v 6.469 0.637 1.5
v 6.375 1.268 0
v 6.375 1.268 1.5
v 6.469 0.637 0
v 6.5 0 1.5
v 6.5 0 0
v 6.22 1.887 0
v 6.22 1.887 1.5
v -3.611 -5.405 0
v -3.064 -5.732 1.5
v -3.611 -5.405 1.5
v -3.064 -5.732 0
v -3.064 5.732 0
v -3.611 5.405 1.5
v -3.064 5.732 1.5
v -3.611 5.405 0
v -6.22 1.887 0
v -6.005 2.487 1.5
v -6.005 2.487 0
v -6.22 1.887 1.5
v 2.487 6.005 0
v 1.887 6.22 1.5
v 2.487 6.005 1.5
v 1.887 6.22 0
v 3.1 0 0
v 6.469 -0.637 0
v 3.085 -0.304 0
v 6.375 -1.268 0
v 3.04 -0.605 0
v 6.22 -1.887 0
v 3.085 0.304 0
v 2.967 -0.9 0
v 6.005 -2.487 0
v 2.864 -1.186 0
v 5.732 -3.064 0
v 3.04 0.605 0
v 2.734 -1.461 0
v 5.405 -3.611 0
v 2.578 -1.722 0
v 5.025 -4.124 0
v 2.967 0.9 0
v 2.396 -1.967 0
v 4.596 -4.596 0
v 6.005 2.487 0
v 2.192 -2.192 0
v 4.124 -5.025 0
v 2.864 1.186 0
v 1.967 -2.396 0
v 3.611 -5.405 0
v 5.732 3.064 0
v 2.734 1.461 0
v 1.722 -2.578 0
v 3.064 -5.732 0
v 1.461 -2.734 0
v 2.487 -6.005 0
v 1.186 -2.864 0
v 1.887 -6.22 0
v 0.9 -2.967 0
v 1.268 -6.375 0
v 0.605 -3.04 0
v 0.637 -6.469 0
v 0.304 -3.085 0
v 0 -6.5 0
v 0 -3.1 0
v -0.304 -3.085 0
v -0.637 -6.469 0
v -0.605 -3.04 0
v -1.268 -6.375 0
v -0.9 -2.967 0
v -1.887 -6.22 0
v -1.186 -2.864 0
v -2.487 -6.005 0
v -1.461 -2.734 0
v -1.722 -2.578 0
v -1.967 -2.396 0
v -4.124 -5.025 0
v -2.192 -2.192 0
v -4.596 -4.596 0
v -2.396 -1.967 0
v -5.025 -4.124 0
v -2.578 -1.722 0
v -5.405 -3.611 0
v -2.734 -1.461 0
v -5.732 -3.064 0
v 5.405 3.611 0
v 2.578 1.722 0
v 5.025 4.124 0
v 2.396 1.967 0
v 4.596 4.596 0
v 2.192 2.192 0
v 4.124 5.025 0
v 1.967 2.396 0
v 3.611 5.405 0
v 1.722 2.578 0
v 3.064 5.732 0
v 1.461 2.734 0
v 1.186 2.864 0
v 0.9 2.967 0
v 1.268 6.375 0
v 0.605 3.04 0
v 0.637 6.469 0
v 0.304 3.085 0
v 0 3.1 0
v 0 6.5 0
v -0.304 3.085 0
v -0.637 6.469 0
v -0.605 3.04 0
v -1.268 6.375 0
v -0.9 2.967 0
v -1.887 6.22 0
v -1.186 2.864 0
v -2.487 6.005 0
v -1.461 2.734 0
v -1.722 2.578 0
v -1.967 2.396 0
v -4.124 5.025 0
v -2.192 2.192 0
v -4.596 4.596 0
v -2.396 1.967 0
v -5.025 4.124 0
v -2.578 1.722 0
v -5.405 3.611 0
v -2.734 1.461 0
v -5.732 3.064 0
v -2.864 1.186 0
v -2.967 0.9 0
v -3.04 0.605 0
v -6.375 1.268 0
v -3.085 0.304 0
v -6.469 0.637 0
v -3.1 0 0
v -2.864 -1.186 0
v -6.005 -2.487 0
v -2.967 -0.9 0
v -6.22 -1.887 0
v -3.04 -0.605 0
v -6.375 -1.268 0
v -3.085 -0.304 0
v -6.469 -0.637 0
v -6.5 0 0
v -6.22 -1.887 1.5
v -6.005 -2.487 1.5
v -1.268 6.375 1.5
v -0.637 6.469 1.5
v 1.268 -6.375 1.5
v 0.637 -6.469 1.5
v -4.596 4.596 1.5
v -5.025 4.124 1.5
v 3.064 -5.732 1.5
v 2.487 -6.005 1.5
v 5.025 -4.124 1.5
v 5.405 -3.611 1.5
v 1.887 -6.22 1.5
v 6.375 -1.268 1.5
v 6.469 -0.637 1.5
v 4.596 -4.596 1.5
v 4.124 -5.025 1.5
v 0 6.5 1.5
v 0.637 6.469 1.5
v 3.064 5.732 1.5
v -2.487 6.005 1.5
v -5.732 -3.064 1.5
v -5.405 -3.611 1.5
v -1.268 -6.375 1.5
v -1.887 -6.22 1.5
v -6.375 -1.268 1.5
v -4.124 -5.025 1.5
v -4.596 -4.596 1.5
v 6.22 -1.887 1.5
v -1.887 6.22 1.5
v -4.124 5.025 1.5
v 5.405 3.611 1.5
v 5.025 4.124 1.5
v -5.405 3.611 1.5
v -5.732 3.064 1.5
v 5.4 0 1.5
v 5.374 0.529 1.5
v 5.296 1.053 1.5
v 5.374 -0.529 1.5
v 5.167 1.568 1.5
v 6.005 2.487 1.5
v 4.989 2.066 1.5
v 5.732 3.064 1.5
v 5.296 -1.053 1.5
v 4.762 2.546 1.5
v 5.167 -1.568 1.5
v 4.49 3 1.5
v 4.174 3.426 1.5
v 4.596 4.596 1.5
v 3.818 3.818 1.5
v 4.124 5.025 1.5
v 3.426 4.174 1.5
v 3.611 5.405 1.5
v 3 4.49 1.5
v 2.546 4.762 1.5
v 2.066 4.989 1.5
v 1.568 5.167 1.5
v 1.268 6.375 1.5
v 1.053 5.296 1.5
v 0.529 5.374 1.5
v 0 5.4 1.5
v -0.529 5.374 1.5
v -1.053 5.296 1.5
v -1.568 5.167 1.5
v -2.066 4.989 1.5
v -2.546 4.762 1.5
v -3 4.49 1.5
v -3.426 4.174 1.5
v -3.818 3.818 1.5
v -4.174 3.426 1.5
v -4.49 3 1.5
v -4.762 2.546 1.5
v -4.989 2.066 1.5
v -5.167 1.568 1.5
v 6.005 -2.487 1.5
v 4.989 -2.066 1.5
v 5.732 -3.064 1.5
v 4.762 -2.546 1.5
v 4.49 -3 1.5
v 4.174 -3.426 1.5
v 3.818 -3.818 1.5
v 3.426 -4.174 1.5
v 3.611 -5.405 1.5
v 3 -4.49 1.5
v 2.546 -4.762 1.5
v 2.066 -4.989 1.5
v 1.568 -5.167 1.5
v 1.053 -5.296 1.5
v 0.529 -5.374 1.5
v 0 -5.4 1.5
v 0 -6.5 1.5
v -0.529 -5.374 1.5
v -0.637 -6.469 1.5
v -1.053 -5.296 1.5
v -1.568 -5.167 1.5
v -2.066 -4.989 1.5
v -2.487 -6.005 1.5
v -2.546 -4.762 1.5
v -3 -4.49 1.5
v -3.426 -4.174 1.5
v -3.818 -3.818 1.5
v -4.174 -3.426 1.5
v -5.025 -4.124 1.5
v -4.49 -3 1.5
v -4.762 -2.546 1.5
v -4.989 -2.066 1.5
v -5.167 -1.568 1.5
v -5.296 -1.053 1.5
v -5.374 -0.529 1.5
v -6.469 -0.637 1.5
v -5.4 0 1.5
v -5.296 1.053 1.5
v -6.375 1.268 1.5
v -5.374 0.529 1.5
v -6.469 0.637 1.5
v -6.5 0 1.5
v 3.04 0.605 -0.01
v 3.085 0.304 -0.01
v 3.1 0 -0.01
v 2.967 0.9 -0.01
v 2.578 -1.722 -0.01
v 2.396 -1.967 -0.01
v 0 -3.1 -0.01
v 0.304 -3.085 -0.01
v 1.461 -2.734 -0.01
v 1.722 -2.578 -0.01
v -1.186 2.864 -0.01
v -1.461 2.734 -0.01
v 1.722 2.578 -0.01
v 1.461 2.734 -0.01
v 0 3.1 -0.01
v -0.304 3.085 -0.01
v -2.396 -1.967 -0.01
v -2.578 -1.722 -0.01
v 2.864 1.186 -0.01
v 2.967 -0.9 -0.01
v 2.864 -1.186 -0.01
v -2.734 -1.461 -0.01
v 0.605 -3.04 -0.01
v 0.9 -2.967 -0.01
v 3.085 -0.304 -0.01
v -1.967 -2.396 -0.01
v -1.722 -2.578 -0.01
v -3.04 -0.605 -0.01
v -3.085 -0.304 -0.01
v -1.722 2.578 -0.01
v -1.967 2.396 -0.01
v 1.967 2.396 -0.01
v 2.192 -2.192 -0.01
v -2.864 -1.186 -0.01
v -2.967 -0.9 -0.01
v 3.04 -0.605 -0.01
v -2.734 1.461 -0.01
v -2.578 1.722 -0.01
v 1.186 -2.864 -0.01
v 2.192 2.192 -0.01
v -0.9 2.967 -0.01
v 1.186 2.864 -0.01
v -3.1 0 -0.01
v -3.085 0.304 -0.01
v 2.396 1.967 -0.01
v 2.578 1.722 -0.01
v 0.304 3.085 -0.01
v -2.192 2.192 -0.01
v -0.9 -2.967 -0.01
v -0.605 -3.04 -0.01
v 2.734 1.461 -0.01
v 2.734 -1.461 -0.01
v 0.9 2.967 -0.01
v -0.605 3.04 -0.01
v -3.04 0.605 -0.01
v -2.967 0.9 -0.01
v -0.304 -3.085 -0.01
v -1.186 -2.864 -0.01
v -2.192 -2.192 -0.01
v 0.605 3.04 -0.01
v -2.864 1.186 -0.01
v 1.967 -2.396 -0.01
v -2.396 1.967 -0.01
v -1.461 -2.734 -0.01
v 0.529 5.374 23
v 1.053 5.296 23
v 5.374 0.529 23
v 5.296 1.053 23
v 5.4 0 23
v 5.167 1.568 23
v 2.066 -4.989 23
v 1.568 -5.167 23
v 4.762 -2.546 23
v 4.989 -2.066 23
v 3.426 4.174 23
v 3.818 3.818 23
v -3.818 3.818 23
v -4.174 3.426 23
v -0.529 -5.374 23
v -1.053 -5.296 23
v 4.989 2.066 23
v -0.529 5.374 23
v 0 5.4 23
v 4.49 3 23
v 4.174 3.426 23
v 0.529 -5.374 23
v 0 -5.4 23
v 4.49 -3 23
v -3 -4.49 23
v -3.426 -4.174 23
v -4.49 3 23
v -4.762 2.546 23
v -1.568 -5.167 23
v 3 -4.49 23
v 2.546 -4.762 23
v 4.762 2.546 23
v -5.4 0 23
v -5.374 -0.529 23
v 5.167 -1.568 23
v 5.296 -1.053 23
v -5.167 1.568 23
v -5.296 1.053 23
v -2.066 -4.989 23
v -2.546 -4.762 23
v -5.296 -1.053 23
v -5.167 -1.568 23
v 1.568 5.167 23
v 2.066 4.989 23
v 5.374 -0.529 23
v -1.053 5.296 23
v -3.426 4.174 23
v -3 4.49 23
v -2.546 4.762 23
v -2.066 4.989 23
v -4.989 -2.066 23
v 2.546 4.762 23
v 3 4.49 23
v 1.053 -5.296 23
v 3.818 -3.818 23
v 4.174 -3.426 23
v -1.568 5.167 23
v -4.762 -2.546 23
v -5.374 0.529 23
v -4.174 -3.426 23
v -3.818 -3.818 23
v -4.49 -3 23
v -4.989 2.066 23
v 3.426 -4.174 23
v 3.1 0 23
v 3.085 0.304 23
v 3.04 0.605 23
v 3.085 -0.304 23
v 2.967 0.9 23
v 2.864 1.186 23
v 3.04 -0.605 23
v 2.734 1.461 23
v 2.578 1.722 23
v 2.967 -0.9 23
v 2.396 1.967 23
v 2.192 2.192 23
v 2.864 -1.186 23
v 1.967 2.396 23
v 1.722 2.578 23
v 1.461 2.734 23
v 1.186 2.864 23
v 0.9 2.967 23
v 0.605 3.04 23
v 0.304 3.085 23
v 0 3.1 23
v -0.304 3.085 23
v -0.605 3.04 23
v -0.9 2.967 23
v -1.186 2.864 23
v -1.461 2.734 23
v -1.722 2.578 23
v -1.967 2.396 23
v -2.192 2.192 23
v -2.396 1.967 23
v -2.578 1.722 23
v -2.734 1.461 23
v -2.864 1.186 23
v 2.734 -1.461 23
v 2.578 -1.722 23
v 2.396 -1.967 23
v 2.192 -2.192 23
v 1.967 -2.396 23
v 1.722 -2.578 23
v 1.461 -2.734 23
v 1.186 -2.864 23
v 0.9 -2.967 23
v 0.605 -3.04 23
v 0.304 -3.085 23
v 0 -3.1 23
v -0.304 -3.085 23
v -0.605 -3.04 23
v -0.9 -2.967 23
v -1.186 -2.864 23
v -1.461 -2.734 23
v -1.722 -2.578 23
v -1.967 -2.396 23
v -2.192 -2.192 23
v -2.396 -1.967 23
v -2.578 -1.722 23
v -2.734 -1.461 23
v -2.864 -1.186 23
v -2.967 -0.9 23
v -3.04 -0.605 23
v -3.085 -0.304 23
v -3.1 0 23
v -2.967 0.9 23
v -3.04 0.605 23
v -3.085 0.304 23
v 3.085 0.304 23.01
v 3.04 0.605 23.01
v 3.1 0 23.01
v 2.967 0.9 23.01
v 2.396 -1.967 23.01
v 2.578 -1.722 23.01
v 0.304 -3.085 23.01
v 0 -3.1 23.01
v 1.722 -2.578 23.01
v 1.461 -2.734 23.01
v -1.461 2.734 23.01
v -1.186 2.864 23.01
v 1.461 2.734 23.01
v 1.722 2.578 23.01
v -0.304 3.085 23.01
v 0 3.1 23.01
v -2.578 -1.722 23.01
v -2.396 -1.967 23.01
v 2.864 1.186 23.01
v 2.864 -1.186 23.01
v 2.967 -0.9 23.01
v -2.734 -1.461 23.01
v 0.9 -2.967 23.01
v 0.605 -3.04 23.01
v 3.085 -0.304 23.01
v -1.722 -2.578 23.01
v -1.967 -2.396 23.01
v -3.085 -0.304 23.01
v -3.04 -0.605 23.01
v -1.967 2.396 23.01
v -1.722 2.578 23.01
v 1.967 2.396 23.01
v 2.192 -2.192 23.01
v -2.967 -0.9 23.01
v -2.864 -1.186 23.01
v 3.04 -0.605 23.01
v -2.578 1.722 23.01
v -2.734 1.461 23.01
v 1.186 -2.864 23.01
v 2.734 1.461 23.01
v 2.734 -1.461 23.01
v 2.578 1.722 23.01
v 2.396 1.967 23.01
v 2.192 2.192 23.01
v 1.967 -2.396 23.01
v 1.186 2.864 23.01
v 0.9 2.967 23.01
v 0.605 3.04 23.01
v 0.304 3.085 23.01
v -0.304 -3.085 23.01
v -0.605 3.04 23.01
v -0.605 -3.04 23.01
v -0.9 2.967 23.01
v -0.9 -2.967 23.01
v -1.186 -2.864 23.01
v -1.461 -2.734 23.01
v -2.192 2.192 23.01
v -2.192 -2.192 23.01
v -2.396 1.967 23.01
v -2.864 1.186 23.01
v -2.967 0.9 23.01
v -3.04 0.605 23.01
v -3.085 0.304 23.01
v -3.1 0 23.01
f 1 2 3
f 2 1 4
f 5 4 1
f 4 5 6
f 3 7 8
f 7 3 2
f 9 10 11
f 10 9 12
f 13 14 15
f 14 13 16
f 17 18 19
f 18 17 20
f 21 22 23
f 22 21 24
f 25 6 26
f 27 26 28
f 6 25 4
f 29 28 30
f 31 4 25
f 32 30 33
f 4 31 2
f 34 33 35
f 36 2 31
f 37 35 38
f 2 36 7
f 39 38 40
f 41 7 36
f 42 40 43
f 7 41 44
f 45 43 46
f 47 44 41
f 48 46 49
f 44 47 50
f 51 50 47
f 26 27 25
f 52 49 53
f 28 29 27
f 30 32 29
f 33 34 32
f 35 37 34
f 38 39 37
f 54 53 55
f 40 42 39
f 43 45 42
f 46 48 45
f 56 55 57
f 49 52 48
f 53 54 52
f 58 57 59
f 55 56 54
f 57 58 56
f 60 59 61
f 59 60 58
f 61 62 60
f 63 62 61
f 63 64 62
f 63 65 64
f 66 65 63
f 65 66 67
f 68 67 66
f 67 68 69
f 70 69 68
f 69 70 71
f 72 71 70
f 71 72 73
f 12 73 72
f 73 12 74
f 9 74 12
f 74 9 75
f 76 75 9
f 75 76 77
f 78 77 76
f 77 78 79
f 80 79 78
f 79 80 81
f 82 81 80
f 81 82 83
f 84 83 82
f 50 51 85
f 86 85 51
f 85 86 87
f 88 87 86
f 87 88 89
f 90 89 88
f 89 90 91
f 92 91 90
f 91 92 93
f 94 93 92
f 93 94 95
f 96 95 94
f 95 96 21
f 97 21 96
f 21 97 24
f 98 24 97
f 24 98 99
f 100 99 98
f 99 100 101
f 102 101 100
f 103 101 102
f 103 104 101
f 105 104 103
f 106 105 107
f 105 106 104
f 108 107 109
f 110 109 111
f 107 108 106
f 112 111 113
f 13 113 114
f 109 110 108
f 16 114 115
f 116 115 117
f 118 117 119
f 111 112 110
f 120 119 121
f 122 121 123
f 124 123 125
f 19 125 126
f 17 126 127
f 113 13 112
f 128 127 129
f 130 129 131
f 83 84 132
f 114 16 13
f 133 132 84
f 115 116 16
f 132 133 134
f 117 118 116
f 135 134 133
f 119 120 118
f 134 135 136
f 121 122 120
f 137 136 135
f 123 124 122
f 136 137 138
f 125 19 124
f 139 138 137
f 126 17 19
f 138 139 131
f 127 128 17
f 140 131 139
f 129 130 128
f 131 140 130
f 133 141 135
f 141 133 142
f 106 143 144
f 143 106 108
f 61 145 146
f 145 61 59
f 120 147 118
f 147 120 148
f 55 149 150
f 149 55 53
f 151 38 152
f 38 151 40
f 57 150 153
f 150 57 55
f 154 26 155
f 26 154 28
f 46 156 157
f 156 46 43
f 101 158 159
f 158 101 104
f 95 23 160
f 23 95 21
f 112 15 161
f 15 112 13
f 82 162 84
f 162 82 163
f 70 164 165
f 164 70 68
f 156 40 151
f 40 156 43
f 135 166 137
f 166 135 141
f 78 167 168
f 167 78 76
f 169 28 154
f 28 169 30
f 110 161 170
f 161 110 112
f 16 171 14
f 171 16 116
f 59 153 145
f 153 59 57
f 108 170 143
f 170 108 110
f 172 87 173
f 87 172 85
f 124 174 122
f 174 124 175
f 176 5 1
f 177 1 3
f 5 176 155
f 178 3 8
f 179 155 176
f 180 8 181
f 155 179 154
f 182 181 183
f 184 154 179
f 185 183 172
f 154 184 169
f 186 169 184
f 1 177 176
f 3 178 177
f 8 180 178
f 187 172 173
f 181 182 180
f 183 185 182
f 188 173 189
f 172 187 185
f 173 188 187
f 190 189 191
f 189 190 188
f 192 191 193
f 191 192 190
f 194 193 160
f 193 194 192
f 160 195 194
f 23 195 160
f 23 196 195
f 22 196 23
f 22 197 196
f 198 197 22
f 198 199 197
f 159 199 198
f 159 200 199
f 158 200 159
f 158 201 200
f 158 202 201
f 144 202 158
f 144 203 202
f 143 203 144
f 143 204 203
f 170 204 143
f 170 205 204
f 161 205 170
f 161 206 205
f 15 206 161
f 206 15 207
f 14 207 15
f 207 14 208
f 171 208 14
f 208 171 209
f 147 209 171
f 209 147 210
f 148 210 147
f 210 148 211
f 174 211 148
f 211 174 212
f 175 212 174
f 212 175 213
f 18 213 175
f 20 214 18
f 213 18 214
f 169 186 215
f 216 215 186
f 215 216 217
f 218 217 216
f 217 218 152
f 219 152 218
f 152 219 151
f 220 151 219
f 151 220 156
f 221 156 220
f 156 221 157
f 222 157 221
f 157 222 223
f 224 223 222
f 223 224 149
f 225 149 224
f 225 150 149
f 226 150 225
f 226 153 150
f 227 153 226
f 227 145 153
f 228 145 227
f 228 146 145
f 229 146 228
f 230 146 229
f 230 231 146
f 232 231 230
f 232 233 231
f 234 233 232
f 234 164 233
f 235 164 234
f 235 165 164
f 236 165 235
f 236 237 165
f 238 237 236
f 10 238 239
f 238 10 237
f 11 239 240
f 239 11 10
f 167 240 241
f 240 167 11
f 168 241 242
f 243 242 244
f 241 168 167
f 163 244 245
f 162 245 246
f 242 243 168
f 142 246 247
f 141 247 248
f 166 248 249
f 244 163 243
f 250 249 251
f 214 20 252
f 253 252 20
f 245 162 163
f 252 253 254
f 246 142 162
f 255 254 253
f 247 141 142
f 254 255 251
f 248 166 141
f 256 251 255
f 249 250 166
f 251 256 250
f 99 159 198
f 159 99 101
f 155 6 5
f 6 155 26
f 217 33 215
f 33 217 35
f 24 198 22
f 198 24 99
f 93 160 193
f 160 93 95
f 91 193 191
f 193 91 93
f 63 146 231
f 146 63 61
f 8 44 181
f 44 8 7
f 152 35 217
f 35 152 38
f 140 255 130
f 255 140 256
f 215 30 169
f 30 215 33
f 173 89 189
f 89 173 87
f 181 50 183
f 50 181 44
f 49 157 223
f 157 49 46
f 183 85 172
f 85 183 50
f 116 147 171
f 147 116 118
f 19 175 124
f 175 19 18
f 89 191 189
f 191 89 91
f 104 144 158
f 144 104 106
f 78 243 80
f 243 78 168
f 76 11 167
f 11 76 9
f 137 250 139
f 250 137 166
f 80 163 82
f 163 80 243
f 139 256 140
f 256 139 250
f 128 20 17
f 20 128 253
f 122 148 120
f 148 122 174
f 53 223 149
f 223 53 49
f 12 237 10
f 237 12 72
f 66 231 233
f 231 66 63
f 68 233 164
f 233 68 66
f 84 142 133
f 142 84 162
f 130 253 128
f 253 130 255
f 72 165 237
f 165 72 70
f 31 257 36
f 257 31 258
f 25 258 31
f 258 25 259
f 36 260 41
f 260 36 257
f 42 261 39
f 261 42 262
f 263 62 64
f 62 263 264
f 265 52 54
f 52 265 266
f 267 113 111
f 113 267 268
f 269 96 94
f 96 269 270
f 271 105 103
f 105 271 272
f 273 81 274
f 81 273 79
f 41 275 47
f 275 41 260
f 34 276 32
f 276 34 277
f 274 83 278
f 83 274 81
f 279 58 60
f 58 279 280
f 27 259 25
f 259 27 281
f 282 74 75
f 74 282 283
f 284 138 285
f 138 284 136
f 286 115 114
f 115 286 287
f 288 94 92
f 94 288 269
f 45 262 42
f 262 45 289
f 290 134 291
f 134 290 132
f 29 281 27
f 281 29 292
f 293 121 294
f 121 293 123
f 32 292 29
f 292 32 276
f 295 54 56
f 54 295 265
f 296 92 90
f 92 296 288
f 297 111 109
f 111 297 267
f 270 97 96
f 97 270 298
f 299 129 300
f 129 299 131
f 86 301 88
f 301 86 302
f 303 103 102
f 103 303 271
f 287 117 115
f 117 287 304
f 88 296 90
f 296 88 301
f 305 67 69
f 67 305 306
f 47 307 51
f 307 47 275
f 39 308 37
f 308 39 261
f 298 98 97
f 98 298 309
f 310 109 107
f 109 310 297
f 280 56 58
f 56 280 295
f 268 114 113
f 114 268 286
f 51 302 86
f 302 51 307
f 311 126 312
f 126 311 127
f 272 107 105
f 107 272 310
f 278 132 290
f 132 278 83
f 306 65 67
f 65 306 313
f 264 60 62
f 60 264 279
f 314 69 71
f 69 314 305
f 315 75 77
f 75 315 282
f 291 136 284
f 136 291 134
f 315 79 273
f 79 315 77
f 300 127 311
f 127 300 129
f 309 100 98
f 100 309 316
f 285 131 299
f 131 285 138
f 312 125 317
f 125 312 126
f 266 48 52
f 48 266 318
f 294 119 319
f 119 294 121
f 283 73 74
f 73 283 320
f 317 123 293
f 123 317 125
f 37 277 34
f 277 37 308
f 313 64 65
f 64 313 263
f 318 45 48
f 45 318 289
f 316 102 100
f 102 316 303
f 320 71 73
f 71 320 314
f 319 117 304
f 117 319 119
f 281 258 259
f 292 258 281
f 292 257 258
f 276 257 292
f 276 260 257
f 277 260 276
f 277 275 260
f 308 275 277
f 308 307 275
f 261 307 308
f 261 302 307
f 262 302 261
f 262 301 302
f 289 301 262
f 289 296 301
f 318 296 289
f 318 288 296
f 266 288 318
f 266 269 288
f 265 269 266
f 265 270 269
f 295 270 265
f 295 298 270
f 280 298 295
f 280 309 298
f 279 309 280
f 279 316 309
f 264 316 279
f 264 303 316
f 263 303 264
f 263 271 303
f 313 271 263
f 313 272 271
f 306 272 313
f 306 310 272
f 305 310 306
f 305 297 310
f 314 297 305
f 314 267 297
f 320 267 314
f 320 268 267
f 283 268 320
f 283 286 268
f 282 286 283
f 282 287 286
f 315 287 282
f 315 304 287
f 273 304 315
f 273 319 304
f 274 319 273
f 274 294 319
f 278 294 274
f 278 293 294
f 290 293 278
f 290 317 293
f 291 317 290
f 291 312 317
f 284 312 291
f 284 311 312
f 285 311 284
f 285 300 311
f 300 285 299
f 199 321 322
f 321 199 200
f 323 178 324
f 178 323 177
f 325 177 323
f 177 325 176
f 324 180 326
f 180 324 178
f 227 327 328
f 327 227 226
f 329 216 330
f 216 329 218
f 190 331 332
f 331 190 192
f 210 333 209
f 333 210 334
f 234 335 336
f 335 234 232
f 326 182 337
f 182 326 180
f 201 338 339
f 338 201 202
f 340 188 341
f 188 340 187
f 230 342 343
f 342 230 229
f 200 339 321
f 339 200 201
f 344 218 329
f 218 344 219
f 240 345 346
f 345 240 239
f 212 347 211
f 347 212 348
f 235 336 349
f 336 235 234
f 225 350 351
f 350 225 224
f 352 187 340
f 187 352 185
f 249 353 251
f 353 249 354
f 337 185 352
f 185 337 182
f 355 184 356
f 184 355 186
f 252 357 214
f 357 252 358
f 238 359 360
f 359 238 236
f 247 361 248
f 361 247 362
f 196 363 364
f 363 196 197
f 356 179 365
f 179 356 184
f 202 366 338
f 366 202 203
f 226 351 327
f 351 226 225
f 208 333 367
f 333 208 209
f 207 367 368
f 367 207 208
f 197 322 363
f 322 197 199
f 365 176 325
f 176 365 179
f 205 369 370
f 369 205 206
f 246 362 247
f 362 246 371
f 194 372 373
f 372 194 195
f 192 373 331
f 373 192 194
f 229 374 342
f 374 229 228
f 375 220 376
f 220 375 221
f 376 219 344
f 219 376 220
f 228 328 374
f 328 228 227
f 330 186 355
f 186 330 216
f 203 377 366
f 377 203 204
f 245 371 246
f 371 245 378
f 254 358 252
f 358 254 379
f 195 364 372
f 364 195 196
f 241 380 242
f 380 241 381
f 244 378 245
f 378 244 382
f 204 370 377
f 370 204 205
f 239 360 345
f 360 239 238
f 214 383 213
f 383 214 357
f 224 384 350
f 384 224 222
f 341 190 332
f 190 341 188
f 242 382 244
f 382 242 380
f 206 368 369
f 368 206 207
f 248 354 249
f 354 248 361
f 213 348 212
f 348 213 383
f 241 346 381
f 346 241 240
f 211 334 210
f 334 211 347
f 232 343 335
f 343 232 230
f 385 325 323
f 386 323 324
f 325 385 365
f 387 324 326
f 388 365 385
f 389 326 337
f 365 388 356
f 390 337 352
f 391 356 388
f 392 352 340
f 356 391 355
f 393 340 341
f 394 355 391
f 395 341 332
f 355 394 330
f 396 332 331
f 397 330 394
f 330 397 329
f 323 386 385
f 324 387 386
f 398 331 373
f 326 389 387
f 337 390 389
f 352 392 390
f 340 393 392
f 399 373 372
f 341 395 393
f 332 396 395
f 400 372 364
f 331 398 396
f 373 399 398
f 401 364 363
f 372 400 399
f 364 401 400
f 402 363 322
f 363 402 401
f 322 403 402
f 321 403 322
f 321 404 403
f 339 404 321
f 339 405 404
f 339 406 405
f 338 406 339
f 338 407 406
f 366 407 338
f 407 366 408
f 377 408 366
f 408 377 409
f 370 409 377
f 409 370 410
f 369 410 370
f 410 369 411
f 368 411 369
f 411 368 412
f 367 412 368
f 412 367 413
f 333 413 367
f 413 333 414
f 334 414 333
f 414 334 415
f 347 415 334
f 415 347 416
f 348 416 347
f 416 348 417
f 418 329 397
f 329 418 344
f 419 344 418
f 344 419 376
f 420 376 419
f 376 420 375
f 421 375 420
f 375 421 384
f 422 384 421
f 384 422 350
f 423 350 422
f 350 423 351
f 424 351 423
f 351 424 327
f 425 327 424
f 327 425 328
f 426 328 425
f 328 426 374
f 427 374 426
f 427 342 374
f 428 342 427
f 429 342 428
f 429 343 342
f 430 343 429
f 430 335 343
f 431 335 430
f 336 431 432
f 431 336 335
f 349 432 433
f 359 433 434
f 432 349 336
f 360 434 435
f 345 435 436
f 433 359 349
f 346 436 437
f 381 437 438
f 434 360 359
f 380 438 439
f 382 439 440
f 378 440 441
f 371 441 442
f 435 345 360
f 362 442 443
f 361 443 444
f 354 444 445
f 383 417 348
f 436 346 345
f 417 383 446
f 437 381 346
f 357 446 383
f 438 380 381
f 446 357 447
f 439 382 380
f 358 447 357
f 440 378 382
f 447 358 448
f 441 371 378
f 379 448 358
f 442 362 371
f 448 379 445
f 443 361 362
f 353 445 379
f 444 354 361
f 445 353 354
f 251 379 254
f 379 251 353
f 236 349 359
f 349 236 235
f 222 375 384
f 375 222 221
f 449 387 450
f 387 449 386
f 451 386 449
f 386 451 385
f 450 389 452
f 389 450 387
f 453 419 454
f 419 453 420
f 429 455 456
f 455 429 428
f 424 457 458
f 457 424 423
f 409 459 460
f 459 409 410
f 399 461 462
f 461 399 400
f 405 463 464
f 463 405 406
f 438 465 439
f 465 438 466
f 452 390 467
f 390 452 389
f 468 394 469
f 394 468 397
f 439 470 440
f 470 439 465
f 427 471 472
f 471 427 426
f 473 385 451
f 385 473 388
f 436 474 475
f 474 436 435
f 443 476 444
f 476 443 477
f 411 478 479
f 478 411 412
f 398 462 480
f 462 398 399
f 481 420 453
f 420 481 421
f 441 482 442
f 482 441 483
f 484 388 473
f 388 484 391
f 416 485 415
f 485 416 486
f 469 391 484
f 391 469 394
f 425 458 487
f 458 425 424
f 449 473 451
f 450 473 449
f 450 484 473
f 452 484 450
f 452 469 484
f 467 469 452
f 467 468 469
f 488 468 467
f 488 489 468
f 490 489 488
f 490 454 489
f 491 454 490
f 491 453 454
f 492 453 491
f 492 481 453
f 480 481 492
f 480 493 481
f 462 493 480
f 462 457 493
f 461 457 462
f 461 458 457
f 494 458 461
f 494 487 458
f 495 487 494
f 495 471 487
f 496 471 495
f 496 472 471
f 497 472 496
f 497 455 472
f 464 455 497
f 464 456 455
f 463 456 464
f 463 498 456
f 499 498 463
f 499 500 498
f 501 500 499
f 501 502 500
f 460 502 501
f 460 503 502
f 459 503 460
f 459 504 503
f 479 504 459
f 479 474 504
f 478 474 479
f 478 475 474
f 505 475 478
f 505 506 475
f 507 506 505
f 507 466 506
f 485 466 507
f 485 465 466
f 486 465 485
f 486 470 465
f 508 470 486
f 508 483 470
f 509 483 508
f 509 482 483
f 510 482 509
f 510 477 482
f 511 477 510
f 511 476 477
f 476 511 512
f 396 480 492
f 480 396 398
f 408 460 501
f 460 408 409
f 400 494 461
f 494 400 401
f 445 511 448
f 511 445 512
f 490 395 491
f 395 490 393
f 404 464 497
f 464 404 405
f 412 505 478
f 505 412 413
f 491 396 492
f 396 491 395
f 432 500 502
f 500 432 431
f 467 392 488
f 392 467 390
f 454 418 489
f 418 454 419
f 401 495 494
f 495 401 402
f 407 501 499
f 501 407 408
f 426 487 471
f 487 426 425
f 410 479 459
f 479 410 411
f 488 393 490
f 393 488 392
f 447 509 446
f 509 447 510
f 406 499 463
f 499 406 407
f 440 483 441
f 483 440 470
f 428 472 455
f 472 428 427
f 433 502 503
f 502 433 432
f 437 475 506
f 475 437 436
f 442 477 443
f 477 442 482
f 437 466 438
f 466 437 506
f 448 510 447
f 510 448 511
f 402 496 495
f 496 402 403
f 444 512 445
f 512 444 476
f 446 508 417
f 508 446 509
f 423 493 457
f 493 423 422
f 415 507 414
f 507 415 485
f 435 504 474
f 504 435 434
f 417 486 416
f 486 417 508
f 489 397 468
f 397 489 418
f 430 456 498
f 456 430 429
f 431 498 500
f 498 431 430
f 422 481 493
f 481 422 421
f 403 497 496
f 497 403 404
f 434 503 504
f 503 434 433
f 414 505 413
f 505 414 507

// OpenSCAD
// Adapter sleeve for 0.2 mL PCR tube in 1.5 mL rack hole
// Print orientation: upside down (collar on bed, sleeve body upward)

// Dimensions
collar_diameter = 13;       // mm, outer diameter of collar
collar_thickness = 1.5;     // mm, height of collar
sleeve_od = 10.8;           // mm, outer diameter of sleeve body
sleeve_height = 21.5;       // mm, height of sleeve body (from collar top to top of sleeve)
bore_diameter = 6.2;        // mm, inner bore diameter

// Resolution
$fn = 64;

// Collar (bottom part) - from z=0 to z=1.5
module collar_part() {
    collar_radius = collar_diameter / 2;
    bore_radius = bore_diameter / 2;
    
    // Main collar cylinder
    cylinder(h = collar_thickness, r = collar_radius, center = false);
    
    // Subtract bore (extend 0.01 mm below and above collar)
    translate([0, 0, -0.01]) {
        cylinder(h = collar_thickness + 0.02, r = bore_radius, center = false);
    }
}

// Sleeve body (on top of collar) - from z=1.5 to z=23.0
module sleeve_body() {
    sleeve_radius = sleeve_od / 2;
    bore_radius = bore_diameter / 2;
    
    // Main sleeve cylinder
    translate([0, 0, collar_thickness]) {
        cylinder(h = sleeve_height, r = sleeve_radius, center = false);
    }
    
    // Subtract bore (extend 0.01 mm below and above sleeve body)
    translate([0, 0, collar_thickness - 0.01]) {
        cylinder(h = sleeve_height + 0.02, r = bore_radius, center = false);
    }
}

// Build the complete adapter
collar_part();
sleeve_body();
